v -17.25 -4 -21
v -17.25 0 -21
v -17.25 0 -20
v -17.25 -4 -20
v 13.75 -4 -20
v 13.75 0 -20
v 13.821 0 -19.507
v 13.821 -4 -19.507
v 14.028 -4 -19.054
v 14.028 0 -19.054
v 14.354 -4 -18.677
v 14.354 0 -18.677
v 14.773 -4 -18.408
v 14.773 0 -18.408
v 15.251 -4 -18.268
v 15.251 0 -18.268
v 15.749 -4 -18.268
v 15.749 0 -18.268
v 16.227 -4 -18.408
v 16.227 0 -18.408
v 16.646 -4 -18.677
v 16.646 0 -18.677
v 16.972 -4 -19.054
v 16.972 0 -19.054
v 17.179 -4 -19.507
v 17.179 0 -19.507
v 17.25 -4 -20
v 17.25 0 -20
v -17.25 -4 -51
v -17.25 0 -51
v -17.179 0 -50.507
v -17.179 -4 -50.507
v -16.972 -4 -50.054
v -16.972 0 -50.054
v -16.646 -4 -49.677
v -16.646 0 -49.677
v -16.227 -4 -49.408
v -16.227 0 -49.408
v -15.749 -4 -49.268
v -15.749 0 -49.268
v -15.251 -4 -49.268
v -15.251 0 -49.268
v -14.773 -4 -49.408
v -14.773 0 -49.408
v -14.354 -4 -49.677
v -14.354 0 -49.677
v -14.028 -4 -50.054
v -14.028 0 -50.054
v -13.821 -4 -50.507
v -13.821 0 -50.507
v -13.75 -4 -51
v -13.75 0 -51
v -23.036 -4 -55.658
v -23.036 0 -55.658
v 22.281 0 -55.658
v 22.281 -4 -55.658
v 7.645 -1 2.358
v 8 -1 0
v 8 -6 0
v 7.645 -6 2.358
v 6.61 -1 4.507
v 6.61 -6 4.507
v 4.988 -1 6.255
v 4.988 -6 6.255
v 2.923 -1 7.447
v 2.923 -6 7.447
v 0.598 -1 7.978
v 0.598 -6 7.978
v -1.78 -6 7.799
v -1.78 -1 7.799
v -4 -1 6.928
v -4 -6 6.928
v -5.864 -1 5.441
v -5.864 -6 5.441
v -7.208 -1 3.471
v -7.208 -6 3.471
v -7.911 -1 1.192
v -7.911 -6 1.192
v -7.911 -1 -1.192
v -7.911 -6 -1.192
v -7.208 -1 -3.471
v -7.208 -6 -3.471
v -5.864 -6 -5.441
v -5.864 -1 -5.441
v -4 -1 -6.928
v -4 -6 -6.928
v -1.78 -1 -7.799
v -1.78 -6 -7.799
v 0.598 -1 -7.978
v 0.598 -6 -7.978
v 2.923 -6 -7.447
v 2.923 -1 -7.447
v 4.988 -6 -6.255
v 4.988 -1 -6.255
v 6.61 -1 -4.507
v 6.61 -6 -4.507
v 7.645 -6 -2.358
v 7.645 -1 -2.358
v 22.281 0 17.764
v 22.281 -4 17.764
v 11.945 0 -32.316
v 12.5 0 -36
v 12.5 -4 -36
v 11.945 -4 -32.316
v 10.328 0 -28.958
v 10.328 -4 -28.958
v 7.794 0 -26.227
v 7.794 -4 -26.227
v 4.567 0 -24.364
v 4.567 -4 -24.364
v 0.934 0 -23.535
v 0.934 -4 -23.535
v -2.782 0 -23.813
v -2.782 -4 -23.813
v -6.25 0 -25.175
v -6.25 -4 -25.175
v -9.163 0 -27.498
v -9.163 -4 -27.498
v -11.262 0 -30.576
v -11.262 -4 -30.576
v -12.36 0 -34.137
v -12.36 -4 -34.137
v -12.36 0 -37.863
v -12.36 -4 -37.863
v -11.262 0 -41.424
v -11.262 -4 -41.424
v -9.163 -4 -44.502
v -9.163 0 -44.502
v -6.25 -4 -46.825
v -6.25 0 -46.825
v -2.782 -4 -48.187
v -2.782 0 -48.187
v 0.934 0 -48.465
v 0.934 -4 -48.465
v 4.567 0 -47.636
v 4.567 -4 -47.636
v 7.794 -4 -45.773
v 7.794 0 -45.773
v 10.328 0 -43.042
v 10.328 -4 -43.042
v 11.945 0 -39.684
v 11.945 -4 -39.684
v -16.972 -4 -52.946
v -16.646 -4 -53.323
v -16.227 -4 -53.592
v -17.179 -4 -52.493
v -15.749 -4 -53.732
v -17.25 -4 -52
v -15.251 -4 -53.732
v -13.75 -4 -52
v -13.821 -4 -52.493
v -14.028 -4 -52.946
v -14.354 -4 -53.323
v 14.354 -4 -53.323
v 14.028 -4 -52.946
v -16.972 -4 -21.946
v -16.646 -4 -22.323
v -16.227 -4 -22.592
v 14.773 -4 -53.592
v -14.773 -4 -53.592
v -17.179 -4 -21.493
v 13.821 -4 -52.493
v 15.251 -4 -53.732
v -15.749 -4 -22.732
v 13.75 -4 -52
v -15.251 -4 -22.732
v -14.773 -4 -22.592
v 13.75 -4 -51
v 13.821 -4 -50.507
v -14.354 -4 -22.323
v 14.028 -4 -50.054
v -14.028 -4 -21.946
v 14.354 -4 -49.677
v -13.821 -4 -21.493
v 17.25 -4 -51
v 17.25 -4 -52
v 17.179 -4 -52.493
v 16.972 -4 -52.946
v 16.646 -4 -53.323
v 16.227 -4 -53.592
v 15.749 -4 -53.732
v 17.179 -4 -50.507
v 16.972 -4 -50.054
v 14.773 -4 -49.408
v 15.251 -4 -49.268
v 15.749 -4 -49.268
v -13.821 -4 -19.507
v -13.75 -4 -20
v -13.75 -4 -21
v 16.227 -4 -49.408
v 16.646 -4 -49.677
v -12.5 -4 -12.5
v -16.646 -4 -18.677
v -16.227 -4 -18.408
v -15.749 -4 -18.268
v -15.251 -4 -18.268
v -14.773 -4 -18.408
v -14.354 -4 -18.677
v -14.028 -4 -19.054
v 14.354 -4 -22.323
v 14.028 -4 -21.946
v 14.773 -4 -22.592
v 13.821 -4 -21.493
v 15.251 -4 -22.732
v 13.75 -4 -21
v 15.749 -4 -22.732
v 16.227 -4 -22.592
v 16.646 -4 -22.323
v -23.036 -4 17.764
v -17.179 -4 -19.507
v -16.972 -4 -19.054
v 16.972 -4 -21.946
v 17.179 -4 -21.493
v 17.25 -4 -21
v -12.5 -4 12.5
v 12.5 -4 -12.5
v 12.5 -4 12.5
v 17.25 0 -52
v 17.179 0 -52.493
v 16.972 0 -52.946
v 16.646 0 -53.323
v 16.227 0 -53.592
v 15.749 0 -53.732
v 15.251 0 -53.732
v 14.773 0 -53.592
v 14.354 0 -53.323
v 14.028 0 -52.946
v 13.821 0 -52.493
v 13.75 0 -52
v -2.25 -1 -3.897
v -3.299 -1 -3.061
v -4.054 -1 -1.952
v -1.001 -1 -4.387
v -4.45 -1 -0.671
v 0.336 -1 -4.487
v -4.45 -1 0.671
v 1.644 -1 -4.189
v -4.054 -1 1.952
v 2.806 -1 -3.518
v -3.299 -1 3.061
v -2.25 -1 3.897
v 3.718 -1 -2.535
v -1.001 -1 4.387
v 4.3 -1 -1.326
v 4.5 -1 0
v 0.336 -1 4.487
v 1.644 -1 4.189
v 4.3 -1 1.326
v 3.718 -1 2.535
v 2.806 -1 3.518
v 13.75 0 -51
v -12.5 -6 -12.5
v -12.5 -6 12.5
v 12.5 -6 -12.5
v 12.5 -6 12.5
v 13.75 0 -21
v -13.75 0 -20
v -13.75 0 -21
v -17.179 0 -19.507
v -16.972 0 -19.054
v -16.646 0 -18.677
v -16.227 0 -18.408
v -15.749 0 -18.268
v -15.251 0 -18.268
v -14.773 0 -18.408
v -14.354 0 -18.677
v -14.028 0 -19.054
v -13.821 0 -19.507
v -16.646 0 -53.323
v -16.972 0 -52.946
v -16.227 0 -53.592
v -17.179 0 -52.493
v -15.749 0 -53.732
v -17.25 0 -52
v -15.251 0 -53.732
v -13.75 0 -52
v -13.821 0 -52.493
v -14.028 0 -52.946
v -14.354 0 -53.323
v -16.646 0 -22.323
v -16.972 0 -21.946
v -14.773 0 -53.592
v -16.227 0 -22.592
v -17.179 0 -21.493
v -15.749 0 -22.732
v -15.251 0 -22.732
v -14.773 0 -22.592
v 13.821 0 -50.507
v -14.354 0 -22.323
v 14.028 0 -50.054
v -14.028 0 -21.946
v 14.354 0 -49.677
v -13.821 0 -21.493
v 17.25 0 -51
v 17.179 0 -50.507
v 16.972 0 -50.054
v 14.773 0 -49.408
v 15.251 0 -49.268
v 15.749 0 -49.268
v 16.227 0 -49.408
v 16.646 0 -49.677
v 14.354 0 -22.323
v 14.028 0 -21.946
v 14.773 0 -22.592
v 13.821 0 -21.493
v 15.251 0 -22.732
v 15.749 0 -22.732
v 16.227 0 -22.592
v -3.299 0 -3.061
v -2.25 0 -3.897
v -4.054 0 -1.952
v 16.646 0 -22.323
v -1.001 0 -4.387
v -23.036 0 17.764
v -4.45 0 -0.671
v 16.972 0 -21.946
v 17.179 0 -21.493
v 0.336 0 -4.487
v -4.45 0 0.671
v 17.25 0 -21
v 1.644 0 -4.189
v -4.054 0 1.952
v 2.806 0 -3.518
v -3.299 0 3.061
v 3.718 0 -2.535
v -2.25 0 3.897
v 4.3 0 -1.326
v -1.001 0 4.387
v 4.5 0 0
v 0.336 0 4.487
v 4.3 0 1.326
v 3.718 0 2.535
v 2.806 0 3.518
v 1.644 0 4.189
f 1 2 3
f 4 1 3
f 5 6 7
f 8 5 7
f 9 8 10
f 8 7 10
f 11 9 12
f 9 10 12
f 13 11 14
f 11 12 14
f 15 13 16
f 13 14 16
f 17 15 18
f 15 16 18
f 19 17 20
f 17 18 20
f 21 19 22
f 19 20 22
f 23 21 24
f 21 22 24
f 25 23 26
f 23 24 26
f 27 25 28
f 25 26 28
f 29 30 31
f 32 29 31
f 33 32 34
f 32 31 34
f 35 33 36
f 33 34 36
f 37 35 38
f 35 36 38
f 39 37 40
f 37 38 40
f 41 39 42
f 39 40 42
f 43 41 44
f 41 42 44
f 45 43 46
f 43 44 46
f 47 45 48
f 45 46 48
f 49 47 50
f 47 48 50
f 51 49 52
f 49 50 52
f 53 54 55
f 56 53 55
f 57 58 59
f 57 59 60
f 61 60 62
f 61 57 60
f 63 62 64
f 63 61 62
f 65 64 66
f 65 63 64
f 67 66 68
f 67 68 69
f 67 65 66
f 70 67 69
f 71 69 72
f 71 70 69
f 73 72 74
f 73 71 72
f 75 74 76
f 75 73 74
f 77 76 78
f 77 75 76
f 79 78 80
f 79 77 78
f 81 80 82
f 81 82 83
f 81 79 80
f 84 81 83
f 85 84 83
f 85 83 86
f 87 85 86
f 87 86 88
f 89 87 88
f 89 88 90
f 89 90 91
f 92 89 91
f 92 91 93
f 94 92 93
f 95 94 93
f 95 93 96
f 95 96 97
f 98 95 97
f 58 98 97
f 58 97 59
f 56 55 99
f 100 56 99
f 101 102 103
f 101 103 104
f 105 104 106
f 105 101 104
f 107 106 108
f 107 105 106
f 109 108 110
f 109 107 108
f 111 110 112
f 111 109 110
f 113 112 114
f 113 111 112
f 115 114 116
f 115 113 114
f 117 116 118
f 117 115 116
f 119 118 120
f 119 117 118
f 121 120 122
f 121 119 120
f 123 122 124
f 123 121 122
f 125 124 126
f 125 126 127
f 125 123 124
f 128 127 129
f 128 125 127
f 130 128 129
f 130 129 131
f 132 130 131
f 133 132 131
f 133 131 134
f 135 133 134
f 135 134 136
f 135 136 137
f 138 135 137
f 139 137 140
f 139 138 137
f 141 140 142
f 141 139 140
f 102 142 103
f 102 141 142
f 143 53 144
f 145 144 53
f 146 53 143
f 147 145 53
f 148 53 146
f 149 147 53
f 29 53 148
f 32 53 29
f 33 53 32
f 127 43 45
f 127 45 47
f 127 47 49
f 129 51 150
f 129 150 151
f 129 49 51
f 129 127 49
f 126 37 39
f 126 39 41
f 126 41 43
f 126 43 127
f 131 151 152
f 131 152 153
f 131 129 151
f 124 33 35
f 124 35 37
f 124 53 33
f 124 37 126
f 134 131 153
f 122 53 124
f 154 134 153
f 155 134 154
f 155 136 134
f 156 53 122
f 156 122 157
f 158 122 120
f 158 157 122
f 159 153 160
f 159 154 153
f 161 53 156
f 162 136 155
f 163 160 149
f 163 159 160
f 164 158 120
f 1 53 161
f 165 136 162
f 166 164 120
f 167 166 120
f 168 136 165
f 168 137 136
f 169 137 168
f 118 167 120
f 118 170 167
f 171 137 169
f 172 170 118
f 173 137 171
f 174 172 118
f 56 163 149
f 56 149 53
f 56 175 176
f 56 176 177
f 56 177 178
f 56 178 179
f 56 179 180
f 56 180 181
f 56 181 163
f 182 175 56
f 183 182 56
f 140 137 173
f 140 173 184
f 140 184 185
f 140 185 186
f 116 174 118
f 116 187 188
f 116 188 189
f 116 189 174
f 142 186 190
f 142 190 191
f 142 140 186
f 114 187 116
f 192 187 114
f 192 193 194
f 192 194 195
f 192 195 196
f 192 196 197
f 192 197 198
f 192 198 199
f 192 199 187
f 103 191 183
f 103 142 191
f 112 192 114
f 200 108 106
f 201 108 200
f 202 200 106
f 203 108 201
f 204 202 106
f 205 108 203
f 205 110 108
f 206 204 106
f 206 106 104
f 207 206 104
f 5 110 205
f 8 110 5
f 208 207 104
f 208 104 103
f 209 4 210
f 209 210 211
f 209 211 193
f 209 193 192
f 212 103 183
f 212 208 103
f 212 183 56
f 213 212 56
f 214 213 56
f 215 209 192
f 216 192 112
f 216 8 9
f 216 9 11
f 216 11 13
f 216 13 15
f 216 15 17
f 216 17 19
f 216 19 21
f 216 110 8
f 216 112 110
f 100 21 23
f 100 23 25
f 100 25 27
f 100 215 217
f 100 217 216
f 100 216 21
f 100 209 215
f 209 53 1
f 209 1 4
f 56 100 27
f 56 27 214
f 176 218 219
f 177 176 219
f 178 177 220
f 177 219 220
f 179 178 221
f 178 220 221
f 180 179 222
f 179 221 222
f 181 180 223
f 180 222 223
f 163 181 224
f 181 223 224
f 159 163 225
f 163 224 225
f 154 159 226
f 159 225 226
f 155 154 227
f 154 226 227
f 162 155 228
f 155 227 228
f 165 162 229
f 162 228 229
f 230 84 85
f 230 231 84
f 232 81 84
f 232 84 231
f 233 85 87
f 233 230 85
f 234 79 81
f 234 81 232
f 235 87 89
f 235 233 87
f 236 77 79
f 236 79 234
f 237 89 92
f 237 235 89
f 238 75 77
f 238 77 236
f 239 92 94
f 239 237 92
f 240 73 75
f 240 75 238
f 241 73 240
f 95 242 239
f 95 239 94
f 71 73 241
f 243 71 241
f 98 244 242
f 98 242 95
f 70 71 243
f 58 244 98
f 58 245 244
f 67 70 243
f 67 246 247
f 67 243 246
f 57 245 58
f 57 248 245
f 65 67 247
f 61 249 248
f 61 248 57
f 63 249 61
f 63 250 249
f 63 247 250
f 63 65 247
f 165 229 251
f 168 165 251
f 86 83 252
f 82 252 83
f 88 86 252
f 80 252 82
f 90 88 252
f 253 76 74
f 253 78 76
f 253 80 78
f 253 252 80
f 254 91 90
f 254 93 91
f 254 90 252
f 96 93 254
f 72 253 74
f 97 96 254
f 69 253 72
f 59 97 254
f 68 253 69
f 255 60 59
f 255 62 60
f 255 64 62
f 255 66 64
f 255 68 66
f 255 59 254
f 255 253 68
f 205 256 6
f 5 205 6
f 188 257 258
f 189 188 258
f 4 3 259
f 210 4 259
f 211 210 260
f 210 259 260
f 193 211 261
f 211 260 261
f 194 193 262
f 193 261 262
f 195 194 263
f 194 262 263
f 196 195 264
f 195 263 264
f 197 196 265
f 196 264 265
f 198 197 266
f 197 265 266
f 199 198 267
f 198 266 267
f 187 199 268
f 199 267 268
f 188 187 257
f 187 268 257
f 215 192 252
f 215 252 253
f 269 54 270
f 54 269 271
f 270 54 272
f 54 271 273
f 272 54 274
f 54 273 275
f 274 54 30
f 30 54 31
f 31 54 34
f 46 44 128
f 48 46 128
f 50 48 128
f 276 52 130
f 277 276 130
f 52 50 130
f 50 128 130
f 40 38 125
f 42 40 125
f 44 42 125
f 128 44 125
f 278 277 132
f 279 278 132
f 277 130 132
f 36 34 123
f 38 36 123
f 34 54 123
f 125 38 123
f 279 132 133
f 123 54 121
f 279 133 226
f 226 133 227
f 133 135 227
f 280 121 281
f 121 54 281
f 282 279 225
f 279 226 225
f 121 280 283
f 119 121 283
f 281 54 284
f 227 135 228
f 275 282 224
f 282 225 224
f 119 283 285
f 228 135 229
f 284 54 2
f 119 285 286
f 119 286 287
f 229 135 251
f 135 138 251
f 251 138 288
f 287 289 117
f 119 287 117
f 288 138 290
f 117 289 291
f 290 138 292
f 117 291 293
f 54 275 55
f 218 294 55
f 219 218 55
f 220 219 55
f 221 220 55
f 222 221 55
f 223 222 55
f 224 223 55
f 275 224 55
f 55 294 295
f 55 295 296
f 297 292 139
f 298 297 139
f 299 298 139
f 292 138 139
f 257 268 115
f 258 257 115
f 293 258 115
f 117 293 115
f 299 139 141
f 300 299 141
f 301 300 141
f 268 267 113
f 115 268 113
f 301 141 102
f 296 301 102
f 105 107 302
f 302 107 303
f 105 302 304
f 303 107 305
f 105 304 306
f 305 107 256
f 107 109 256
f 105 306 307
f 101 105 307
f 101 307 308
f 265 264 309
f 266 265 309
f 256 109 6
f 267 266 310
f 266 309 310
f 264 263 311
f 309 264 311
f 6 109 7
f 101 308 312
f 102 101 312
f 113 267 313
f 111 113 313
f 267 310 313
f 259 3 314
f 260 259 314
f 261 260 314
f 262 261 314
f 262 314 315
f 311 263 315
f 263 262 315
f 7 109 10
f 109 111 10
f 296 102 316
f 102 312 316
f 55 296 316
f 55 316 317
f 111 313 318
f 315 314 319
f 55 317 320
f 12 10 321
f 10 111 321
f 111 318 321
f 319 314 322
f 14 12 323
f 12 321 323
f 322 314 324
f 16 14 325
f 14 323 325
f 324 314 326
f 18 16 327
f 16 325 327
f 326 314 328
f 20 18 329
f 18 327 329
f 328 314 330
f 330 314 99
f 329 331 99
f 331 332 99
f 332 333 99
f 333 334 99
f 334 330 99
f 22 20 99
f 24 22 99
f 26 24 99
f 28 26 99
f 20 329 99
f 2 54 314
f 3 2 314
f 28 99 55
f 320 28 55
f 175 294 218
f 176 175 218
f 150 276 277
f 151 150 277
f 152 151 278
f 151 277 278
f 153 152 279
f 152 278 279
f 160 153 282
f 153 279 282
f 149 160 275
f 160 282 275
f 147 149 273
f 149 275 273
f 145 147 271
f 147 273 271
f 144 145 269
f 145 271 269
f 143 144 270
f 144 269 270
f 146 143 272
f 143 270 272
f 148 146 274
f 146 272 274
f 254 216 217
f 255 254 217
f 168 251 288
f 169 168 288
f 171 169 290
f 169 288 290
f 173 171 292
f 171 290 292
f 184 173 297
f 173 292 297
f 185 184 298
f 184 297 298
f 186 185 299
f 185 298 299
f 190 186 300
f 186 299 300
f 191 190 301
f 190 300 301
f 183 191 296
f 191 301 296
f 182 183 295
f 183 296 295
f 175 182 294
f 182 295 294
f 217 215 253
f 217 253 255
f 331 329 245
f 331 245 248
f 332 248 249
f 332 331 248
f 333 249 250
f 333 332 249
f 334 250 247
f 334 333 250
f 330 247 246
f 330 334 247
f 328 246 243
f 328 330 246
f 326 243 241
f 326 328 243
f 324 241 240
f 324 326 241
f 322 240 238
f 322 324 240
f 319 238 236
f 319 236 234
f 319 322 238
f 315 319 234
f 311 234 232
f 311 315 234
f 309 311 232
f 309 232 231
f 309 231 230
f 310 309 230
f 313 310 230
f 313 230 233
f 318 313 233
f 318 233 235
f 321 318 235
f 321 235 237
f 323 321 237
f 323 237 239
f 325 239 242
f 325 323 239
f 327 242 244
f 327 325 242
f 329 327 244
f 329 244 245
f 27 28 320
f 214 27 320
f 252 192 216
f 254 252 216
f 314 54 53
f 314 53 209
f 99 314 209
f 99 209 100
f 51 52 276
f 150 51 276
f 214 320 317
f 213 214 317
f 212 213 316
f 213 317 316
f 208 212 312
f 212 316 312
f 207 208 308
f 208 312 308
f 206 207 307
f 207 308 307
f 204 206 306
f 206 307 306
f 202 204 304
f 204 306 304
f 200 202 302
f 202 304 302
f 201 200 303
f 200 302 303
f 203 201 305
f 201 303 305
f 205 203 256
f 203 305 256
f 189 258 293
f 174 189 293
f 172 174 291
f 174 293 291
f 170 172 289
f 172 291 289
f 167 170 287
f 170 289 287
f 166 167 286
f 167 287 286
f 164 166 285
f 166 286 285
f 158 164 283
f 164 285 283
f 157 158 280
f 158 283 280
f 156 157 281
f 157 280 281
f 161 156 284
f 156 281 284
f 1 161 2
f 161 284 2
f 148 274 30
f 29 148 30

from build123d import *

# Parameters (mm, degrees)
F0_W     = 45.317253
F0_H     = 73.422673
F0_R     = 12.5
F0_W_2   = 25
F0_H_2   = 25
F1_DEPTH = 4
F0_R_2   = 8
F2_DEPTH = 6
F0_R_3   = 4.5
F3_DEPTH = 1


with BuildPart() as f1:
    # F0 (on Front) → F1 (new body)
    with BuildSketch(Plane.XZ):
        with Locations((-0.377299, -18.946934)):
            Rectangle(F0_W, F0_H)
        with BuildLine():
            ThreePointArc((-13.75, -52), (-15.5, -53.75), (-17.25, -52))
            Line((-17.25, -52), (-17.25, -51))
            ThreePointArc((-17.25, -51), (-15.5, -49.25), (-13.75, -51))
            Line((-13.75, -51), (-13.75, -52))
        make_face(mode=Mode.SUBTRACT)
        with BuildLine():
            ThreePointArc((-17.25, -20), (-15.5, -18.25), (-13.75, -20))
            Line((-13.75, -20), (-13.75, -21))
            ThreePointArc((-13.75, -21), (-15.5, -22.75), (-17.25, -21))
            Line((-17.25, -21), (-17.25, -20))
        make_face(mode=Mode.SUBTRACT)
        with BuildLine():
            Line((17.25, -51), (17.25, -52))
            ThreePointArc((17.25, -52), (15.5, -53.75), (13.75, -52))
            Line((13.75, -52), (13.75, -51))
            ThreePointArc((13.75, -51), (15.5, -49.25), (17.25, -51))
        make_face(mode=Mode.SUBTRACT)
        with Locations((0, -36)):
            Circle(F0_R, mode=Mode.SUBTRACT)
        with BuildLine():
            Line((13.75, -21), (13.75, -20))
            ThreePointArc((13.75, -20), (15.5, -18.25), (17.25, -20))
            Line((17.25, -20), (17.25, -21))
            ThreePointArc((17.25, -21), (15.5, -22.75), (13.75, -21))
        make_face(mode=Mode.SUBTRACT)
        Rectangle(F0_W_2, F0_H_2, mode=Mode.SUBTRACT)
    extrude(amount=F1_DEPTH)

    # F0 (on Front) → F2 (join)
    with BuildSketch(Plane.XZ):
        Rectangle(F0_W_2, F0_H_2)
        Circle(F0_R_2, mode=Mode.SUBTRACT)
    extrude(amount=F2_DEPTH)

    # F0 (on Front) → F3 (join)
    with BuildSketch(Plane.XZ):
        Circle(F0_R_2)
        Circle(F0_R_3, mode=Mode.SUBTRACT)
    extrude(amount=F3_DEPTH)


solid = f1.part
